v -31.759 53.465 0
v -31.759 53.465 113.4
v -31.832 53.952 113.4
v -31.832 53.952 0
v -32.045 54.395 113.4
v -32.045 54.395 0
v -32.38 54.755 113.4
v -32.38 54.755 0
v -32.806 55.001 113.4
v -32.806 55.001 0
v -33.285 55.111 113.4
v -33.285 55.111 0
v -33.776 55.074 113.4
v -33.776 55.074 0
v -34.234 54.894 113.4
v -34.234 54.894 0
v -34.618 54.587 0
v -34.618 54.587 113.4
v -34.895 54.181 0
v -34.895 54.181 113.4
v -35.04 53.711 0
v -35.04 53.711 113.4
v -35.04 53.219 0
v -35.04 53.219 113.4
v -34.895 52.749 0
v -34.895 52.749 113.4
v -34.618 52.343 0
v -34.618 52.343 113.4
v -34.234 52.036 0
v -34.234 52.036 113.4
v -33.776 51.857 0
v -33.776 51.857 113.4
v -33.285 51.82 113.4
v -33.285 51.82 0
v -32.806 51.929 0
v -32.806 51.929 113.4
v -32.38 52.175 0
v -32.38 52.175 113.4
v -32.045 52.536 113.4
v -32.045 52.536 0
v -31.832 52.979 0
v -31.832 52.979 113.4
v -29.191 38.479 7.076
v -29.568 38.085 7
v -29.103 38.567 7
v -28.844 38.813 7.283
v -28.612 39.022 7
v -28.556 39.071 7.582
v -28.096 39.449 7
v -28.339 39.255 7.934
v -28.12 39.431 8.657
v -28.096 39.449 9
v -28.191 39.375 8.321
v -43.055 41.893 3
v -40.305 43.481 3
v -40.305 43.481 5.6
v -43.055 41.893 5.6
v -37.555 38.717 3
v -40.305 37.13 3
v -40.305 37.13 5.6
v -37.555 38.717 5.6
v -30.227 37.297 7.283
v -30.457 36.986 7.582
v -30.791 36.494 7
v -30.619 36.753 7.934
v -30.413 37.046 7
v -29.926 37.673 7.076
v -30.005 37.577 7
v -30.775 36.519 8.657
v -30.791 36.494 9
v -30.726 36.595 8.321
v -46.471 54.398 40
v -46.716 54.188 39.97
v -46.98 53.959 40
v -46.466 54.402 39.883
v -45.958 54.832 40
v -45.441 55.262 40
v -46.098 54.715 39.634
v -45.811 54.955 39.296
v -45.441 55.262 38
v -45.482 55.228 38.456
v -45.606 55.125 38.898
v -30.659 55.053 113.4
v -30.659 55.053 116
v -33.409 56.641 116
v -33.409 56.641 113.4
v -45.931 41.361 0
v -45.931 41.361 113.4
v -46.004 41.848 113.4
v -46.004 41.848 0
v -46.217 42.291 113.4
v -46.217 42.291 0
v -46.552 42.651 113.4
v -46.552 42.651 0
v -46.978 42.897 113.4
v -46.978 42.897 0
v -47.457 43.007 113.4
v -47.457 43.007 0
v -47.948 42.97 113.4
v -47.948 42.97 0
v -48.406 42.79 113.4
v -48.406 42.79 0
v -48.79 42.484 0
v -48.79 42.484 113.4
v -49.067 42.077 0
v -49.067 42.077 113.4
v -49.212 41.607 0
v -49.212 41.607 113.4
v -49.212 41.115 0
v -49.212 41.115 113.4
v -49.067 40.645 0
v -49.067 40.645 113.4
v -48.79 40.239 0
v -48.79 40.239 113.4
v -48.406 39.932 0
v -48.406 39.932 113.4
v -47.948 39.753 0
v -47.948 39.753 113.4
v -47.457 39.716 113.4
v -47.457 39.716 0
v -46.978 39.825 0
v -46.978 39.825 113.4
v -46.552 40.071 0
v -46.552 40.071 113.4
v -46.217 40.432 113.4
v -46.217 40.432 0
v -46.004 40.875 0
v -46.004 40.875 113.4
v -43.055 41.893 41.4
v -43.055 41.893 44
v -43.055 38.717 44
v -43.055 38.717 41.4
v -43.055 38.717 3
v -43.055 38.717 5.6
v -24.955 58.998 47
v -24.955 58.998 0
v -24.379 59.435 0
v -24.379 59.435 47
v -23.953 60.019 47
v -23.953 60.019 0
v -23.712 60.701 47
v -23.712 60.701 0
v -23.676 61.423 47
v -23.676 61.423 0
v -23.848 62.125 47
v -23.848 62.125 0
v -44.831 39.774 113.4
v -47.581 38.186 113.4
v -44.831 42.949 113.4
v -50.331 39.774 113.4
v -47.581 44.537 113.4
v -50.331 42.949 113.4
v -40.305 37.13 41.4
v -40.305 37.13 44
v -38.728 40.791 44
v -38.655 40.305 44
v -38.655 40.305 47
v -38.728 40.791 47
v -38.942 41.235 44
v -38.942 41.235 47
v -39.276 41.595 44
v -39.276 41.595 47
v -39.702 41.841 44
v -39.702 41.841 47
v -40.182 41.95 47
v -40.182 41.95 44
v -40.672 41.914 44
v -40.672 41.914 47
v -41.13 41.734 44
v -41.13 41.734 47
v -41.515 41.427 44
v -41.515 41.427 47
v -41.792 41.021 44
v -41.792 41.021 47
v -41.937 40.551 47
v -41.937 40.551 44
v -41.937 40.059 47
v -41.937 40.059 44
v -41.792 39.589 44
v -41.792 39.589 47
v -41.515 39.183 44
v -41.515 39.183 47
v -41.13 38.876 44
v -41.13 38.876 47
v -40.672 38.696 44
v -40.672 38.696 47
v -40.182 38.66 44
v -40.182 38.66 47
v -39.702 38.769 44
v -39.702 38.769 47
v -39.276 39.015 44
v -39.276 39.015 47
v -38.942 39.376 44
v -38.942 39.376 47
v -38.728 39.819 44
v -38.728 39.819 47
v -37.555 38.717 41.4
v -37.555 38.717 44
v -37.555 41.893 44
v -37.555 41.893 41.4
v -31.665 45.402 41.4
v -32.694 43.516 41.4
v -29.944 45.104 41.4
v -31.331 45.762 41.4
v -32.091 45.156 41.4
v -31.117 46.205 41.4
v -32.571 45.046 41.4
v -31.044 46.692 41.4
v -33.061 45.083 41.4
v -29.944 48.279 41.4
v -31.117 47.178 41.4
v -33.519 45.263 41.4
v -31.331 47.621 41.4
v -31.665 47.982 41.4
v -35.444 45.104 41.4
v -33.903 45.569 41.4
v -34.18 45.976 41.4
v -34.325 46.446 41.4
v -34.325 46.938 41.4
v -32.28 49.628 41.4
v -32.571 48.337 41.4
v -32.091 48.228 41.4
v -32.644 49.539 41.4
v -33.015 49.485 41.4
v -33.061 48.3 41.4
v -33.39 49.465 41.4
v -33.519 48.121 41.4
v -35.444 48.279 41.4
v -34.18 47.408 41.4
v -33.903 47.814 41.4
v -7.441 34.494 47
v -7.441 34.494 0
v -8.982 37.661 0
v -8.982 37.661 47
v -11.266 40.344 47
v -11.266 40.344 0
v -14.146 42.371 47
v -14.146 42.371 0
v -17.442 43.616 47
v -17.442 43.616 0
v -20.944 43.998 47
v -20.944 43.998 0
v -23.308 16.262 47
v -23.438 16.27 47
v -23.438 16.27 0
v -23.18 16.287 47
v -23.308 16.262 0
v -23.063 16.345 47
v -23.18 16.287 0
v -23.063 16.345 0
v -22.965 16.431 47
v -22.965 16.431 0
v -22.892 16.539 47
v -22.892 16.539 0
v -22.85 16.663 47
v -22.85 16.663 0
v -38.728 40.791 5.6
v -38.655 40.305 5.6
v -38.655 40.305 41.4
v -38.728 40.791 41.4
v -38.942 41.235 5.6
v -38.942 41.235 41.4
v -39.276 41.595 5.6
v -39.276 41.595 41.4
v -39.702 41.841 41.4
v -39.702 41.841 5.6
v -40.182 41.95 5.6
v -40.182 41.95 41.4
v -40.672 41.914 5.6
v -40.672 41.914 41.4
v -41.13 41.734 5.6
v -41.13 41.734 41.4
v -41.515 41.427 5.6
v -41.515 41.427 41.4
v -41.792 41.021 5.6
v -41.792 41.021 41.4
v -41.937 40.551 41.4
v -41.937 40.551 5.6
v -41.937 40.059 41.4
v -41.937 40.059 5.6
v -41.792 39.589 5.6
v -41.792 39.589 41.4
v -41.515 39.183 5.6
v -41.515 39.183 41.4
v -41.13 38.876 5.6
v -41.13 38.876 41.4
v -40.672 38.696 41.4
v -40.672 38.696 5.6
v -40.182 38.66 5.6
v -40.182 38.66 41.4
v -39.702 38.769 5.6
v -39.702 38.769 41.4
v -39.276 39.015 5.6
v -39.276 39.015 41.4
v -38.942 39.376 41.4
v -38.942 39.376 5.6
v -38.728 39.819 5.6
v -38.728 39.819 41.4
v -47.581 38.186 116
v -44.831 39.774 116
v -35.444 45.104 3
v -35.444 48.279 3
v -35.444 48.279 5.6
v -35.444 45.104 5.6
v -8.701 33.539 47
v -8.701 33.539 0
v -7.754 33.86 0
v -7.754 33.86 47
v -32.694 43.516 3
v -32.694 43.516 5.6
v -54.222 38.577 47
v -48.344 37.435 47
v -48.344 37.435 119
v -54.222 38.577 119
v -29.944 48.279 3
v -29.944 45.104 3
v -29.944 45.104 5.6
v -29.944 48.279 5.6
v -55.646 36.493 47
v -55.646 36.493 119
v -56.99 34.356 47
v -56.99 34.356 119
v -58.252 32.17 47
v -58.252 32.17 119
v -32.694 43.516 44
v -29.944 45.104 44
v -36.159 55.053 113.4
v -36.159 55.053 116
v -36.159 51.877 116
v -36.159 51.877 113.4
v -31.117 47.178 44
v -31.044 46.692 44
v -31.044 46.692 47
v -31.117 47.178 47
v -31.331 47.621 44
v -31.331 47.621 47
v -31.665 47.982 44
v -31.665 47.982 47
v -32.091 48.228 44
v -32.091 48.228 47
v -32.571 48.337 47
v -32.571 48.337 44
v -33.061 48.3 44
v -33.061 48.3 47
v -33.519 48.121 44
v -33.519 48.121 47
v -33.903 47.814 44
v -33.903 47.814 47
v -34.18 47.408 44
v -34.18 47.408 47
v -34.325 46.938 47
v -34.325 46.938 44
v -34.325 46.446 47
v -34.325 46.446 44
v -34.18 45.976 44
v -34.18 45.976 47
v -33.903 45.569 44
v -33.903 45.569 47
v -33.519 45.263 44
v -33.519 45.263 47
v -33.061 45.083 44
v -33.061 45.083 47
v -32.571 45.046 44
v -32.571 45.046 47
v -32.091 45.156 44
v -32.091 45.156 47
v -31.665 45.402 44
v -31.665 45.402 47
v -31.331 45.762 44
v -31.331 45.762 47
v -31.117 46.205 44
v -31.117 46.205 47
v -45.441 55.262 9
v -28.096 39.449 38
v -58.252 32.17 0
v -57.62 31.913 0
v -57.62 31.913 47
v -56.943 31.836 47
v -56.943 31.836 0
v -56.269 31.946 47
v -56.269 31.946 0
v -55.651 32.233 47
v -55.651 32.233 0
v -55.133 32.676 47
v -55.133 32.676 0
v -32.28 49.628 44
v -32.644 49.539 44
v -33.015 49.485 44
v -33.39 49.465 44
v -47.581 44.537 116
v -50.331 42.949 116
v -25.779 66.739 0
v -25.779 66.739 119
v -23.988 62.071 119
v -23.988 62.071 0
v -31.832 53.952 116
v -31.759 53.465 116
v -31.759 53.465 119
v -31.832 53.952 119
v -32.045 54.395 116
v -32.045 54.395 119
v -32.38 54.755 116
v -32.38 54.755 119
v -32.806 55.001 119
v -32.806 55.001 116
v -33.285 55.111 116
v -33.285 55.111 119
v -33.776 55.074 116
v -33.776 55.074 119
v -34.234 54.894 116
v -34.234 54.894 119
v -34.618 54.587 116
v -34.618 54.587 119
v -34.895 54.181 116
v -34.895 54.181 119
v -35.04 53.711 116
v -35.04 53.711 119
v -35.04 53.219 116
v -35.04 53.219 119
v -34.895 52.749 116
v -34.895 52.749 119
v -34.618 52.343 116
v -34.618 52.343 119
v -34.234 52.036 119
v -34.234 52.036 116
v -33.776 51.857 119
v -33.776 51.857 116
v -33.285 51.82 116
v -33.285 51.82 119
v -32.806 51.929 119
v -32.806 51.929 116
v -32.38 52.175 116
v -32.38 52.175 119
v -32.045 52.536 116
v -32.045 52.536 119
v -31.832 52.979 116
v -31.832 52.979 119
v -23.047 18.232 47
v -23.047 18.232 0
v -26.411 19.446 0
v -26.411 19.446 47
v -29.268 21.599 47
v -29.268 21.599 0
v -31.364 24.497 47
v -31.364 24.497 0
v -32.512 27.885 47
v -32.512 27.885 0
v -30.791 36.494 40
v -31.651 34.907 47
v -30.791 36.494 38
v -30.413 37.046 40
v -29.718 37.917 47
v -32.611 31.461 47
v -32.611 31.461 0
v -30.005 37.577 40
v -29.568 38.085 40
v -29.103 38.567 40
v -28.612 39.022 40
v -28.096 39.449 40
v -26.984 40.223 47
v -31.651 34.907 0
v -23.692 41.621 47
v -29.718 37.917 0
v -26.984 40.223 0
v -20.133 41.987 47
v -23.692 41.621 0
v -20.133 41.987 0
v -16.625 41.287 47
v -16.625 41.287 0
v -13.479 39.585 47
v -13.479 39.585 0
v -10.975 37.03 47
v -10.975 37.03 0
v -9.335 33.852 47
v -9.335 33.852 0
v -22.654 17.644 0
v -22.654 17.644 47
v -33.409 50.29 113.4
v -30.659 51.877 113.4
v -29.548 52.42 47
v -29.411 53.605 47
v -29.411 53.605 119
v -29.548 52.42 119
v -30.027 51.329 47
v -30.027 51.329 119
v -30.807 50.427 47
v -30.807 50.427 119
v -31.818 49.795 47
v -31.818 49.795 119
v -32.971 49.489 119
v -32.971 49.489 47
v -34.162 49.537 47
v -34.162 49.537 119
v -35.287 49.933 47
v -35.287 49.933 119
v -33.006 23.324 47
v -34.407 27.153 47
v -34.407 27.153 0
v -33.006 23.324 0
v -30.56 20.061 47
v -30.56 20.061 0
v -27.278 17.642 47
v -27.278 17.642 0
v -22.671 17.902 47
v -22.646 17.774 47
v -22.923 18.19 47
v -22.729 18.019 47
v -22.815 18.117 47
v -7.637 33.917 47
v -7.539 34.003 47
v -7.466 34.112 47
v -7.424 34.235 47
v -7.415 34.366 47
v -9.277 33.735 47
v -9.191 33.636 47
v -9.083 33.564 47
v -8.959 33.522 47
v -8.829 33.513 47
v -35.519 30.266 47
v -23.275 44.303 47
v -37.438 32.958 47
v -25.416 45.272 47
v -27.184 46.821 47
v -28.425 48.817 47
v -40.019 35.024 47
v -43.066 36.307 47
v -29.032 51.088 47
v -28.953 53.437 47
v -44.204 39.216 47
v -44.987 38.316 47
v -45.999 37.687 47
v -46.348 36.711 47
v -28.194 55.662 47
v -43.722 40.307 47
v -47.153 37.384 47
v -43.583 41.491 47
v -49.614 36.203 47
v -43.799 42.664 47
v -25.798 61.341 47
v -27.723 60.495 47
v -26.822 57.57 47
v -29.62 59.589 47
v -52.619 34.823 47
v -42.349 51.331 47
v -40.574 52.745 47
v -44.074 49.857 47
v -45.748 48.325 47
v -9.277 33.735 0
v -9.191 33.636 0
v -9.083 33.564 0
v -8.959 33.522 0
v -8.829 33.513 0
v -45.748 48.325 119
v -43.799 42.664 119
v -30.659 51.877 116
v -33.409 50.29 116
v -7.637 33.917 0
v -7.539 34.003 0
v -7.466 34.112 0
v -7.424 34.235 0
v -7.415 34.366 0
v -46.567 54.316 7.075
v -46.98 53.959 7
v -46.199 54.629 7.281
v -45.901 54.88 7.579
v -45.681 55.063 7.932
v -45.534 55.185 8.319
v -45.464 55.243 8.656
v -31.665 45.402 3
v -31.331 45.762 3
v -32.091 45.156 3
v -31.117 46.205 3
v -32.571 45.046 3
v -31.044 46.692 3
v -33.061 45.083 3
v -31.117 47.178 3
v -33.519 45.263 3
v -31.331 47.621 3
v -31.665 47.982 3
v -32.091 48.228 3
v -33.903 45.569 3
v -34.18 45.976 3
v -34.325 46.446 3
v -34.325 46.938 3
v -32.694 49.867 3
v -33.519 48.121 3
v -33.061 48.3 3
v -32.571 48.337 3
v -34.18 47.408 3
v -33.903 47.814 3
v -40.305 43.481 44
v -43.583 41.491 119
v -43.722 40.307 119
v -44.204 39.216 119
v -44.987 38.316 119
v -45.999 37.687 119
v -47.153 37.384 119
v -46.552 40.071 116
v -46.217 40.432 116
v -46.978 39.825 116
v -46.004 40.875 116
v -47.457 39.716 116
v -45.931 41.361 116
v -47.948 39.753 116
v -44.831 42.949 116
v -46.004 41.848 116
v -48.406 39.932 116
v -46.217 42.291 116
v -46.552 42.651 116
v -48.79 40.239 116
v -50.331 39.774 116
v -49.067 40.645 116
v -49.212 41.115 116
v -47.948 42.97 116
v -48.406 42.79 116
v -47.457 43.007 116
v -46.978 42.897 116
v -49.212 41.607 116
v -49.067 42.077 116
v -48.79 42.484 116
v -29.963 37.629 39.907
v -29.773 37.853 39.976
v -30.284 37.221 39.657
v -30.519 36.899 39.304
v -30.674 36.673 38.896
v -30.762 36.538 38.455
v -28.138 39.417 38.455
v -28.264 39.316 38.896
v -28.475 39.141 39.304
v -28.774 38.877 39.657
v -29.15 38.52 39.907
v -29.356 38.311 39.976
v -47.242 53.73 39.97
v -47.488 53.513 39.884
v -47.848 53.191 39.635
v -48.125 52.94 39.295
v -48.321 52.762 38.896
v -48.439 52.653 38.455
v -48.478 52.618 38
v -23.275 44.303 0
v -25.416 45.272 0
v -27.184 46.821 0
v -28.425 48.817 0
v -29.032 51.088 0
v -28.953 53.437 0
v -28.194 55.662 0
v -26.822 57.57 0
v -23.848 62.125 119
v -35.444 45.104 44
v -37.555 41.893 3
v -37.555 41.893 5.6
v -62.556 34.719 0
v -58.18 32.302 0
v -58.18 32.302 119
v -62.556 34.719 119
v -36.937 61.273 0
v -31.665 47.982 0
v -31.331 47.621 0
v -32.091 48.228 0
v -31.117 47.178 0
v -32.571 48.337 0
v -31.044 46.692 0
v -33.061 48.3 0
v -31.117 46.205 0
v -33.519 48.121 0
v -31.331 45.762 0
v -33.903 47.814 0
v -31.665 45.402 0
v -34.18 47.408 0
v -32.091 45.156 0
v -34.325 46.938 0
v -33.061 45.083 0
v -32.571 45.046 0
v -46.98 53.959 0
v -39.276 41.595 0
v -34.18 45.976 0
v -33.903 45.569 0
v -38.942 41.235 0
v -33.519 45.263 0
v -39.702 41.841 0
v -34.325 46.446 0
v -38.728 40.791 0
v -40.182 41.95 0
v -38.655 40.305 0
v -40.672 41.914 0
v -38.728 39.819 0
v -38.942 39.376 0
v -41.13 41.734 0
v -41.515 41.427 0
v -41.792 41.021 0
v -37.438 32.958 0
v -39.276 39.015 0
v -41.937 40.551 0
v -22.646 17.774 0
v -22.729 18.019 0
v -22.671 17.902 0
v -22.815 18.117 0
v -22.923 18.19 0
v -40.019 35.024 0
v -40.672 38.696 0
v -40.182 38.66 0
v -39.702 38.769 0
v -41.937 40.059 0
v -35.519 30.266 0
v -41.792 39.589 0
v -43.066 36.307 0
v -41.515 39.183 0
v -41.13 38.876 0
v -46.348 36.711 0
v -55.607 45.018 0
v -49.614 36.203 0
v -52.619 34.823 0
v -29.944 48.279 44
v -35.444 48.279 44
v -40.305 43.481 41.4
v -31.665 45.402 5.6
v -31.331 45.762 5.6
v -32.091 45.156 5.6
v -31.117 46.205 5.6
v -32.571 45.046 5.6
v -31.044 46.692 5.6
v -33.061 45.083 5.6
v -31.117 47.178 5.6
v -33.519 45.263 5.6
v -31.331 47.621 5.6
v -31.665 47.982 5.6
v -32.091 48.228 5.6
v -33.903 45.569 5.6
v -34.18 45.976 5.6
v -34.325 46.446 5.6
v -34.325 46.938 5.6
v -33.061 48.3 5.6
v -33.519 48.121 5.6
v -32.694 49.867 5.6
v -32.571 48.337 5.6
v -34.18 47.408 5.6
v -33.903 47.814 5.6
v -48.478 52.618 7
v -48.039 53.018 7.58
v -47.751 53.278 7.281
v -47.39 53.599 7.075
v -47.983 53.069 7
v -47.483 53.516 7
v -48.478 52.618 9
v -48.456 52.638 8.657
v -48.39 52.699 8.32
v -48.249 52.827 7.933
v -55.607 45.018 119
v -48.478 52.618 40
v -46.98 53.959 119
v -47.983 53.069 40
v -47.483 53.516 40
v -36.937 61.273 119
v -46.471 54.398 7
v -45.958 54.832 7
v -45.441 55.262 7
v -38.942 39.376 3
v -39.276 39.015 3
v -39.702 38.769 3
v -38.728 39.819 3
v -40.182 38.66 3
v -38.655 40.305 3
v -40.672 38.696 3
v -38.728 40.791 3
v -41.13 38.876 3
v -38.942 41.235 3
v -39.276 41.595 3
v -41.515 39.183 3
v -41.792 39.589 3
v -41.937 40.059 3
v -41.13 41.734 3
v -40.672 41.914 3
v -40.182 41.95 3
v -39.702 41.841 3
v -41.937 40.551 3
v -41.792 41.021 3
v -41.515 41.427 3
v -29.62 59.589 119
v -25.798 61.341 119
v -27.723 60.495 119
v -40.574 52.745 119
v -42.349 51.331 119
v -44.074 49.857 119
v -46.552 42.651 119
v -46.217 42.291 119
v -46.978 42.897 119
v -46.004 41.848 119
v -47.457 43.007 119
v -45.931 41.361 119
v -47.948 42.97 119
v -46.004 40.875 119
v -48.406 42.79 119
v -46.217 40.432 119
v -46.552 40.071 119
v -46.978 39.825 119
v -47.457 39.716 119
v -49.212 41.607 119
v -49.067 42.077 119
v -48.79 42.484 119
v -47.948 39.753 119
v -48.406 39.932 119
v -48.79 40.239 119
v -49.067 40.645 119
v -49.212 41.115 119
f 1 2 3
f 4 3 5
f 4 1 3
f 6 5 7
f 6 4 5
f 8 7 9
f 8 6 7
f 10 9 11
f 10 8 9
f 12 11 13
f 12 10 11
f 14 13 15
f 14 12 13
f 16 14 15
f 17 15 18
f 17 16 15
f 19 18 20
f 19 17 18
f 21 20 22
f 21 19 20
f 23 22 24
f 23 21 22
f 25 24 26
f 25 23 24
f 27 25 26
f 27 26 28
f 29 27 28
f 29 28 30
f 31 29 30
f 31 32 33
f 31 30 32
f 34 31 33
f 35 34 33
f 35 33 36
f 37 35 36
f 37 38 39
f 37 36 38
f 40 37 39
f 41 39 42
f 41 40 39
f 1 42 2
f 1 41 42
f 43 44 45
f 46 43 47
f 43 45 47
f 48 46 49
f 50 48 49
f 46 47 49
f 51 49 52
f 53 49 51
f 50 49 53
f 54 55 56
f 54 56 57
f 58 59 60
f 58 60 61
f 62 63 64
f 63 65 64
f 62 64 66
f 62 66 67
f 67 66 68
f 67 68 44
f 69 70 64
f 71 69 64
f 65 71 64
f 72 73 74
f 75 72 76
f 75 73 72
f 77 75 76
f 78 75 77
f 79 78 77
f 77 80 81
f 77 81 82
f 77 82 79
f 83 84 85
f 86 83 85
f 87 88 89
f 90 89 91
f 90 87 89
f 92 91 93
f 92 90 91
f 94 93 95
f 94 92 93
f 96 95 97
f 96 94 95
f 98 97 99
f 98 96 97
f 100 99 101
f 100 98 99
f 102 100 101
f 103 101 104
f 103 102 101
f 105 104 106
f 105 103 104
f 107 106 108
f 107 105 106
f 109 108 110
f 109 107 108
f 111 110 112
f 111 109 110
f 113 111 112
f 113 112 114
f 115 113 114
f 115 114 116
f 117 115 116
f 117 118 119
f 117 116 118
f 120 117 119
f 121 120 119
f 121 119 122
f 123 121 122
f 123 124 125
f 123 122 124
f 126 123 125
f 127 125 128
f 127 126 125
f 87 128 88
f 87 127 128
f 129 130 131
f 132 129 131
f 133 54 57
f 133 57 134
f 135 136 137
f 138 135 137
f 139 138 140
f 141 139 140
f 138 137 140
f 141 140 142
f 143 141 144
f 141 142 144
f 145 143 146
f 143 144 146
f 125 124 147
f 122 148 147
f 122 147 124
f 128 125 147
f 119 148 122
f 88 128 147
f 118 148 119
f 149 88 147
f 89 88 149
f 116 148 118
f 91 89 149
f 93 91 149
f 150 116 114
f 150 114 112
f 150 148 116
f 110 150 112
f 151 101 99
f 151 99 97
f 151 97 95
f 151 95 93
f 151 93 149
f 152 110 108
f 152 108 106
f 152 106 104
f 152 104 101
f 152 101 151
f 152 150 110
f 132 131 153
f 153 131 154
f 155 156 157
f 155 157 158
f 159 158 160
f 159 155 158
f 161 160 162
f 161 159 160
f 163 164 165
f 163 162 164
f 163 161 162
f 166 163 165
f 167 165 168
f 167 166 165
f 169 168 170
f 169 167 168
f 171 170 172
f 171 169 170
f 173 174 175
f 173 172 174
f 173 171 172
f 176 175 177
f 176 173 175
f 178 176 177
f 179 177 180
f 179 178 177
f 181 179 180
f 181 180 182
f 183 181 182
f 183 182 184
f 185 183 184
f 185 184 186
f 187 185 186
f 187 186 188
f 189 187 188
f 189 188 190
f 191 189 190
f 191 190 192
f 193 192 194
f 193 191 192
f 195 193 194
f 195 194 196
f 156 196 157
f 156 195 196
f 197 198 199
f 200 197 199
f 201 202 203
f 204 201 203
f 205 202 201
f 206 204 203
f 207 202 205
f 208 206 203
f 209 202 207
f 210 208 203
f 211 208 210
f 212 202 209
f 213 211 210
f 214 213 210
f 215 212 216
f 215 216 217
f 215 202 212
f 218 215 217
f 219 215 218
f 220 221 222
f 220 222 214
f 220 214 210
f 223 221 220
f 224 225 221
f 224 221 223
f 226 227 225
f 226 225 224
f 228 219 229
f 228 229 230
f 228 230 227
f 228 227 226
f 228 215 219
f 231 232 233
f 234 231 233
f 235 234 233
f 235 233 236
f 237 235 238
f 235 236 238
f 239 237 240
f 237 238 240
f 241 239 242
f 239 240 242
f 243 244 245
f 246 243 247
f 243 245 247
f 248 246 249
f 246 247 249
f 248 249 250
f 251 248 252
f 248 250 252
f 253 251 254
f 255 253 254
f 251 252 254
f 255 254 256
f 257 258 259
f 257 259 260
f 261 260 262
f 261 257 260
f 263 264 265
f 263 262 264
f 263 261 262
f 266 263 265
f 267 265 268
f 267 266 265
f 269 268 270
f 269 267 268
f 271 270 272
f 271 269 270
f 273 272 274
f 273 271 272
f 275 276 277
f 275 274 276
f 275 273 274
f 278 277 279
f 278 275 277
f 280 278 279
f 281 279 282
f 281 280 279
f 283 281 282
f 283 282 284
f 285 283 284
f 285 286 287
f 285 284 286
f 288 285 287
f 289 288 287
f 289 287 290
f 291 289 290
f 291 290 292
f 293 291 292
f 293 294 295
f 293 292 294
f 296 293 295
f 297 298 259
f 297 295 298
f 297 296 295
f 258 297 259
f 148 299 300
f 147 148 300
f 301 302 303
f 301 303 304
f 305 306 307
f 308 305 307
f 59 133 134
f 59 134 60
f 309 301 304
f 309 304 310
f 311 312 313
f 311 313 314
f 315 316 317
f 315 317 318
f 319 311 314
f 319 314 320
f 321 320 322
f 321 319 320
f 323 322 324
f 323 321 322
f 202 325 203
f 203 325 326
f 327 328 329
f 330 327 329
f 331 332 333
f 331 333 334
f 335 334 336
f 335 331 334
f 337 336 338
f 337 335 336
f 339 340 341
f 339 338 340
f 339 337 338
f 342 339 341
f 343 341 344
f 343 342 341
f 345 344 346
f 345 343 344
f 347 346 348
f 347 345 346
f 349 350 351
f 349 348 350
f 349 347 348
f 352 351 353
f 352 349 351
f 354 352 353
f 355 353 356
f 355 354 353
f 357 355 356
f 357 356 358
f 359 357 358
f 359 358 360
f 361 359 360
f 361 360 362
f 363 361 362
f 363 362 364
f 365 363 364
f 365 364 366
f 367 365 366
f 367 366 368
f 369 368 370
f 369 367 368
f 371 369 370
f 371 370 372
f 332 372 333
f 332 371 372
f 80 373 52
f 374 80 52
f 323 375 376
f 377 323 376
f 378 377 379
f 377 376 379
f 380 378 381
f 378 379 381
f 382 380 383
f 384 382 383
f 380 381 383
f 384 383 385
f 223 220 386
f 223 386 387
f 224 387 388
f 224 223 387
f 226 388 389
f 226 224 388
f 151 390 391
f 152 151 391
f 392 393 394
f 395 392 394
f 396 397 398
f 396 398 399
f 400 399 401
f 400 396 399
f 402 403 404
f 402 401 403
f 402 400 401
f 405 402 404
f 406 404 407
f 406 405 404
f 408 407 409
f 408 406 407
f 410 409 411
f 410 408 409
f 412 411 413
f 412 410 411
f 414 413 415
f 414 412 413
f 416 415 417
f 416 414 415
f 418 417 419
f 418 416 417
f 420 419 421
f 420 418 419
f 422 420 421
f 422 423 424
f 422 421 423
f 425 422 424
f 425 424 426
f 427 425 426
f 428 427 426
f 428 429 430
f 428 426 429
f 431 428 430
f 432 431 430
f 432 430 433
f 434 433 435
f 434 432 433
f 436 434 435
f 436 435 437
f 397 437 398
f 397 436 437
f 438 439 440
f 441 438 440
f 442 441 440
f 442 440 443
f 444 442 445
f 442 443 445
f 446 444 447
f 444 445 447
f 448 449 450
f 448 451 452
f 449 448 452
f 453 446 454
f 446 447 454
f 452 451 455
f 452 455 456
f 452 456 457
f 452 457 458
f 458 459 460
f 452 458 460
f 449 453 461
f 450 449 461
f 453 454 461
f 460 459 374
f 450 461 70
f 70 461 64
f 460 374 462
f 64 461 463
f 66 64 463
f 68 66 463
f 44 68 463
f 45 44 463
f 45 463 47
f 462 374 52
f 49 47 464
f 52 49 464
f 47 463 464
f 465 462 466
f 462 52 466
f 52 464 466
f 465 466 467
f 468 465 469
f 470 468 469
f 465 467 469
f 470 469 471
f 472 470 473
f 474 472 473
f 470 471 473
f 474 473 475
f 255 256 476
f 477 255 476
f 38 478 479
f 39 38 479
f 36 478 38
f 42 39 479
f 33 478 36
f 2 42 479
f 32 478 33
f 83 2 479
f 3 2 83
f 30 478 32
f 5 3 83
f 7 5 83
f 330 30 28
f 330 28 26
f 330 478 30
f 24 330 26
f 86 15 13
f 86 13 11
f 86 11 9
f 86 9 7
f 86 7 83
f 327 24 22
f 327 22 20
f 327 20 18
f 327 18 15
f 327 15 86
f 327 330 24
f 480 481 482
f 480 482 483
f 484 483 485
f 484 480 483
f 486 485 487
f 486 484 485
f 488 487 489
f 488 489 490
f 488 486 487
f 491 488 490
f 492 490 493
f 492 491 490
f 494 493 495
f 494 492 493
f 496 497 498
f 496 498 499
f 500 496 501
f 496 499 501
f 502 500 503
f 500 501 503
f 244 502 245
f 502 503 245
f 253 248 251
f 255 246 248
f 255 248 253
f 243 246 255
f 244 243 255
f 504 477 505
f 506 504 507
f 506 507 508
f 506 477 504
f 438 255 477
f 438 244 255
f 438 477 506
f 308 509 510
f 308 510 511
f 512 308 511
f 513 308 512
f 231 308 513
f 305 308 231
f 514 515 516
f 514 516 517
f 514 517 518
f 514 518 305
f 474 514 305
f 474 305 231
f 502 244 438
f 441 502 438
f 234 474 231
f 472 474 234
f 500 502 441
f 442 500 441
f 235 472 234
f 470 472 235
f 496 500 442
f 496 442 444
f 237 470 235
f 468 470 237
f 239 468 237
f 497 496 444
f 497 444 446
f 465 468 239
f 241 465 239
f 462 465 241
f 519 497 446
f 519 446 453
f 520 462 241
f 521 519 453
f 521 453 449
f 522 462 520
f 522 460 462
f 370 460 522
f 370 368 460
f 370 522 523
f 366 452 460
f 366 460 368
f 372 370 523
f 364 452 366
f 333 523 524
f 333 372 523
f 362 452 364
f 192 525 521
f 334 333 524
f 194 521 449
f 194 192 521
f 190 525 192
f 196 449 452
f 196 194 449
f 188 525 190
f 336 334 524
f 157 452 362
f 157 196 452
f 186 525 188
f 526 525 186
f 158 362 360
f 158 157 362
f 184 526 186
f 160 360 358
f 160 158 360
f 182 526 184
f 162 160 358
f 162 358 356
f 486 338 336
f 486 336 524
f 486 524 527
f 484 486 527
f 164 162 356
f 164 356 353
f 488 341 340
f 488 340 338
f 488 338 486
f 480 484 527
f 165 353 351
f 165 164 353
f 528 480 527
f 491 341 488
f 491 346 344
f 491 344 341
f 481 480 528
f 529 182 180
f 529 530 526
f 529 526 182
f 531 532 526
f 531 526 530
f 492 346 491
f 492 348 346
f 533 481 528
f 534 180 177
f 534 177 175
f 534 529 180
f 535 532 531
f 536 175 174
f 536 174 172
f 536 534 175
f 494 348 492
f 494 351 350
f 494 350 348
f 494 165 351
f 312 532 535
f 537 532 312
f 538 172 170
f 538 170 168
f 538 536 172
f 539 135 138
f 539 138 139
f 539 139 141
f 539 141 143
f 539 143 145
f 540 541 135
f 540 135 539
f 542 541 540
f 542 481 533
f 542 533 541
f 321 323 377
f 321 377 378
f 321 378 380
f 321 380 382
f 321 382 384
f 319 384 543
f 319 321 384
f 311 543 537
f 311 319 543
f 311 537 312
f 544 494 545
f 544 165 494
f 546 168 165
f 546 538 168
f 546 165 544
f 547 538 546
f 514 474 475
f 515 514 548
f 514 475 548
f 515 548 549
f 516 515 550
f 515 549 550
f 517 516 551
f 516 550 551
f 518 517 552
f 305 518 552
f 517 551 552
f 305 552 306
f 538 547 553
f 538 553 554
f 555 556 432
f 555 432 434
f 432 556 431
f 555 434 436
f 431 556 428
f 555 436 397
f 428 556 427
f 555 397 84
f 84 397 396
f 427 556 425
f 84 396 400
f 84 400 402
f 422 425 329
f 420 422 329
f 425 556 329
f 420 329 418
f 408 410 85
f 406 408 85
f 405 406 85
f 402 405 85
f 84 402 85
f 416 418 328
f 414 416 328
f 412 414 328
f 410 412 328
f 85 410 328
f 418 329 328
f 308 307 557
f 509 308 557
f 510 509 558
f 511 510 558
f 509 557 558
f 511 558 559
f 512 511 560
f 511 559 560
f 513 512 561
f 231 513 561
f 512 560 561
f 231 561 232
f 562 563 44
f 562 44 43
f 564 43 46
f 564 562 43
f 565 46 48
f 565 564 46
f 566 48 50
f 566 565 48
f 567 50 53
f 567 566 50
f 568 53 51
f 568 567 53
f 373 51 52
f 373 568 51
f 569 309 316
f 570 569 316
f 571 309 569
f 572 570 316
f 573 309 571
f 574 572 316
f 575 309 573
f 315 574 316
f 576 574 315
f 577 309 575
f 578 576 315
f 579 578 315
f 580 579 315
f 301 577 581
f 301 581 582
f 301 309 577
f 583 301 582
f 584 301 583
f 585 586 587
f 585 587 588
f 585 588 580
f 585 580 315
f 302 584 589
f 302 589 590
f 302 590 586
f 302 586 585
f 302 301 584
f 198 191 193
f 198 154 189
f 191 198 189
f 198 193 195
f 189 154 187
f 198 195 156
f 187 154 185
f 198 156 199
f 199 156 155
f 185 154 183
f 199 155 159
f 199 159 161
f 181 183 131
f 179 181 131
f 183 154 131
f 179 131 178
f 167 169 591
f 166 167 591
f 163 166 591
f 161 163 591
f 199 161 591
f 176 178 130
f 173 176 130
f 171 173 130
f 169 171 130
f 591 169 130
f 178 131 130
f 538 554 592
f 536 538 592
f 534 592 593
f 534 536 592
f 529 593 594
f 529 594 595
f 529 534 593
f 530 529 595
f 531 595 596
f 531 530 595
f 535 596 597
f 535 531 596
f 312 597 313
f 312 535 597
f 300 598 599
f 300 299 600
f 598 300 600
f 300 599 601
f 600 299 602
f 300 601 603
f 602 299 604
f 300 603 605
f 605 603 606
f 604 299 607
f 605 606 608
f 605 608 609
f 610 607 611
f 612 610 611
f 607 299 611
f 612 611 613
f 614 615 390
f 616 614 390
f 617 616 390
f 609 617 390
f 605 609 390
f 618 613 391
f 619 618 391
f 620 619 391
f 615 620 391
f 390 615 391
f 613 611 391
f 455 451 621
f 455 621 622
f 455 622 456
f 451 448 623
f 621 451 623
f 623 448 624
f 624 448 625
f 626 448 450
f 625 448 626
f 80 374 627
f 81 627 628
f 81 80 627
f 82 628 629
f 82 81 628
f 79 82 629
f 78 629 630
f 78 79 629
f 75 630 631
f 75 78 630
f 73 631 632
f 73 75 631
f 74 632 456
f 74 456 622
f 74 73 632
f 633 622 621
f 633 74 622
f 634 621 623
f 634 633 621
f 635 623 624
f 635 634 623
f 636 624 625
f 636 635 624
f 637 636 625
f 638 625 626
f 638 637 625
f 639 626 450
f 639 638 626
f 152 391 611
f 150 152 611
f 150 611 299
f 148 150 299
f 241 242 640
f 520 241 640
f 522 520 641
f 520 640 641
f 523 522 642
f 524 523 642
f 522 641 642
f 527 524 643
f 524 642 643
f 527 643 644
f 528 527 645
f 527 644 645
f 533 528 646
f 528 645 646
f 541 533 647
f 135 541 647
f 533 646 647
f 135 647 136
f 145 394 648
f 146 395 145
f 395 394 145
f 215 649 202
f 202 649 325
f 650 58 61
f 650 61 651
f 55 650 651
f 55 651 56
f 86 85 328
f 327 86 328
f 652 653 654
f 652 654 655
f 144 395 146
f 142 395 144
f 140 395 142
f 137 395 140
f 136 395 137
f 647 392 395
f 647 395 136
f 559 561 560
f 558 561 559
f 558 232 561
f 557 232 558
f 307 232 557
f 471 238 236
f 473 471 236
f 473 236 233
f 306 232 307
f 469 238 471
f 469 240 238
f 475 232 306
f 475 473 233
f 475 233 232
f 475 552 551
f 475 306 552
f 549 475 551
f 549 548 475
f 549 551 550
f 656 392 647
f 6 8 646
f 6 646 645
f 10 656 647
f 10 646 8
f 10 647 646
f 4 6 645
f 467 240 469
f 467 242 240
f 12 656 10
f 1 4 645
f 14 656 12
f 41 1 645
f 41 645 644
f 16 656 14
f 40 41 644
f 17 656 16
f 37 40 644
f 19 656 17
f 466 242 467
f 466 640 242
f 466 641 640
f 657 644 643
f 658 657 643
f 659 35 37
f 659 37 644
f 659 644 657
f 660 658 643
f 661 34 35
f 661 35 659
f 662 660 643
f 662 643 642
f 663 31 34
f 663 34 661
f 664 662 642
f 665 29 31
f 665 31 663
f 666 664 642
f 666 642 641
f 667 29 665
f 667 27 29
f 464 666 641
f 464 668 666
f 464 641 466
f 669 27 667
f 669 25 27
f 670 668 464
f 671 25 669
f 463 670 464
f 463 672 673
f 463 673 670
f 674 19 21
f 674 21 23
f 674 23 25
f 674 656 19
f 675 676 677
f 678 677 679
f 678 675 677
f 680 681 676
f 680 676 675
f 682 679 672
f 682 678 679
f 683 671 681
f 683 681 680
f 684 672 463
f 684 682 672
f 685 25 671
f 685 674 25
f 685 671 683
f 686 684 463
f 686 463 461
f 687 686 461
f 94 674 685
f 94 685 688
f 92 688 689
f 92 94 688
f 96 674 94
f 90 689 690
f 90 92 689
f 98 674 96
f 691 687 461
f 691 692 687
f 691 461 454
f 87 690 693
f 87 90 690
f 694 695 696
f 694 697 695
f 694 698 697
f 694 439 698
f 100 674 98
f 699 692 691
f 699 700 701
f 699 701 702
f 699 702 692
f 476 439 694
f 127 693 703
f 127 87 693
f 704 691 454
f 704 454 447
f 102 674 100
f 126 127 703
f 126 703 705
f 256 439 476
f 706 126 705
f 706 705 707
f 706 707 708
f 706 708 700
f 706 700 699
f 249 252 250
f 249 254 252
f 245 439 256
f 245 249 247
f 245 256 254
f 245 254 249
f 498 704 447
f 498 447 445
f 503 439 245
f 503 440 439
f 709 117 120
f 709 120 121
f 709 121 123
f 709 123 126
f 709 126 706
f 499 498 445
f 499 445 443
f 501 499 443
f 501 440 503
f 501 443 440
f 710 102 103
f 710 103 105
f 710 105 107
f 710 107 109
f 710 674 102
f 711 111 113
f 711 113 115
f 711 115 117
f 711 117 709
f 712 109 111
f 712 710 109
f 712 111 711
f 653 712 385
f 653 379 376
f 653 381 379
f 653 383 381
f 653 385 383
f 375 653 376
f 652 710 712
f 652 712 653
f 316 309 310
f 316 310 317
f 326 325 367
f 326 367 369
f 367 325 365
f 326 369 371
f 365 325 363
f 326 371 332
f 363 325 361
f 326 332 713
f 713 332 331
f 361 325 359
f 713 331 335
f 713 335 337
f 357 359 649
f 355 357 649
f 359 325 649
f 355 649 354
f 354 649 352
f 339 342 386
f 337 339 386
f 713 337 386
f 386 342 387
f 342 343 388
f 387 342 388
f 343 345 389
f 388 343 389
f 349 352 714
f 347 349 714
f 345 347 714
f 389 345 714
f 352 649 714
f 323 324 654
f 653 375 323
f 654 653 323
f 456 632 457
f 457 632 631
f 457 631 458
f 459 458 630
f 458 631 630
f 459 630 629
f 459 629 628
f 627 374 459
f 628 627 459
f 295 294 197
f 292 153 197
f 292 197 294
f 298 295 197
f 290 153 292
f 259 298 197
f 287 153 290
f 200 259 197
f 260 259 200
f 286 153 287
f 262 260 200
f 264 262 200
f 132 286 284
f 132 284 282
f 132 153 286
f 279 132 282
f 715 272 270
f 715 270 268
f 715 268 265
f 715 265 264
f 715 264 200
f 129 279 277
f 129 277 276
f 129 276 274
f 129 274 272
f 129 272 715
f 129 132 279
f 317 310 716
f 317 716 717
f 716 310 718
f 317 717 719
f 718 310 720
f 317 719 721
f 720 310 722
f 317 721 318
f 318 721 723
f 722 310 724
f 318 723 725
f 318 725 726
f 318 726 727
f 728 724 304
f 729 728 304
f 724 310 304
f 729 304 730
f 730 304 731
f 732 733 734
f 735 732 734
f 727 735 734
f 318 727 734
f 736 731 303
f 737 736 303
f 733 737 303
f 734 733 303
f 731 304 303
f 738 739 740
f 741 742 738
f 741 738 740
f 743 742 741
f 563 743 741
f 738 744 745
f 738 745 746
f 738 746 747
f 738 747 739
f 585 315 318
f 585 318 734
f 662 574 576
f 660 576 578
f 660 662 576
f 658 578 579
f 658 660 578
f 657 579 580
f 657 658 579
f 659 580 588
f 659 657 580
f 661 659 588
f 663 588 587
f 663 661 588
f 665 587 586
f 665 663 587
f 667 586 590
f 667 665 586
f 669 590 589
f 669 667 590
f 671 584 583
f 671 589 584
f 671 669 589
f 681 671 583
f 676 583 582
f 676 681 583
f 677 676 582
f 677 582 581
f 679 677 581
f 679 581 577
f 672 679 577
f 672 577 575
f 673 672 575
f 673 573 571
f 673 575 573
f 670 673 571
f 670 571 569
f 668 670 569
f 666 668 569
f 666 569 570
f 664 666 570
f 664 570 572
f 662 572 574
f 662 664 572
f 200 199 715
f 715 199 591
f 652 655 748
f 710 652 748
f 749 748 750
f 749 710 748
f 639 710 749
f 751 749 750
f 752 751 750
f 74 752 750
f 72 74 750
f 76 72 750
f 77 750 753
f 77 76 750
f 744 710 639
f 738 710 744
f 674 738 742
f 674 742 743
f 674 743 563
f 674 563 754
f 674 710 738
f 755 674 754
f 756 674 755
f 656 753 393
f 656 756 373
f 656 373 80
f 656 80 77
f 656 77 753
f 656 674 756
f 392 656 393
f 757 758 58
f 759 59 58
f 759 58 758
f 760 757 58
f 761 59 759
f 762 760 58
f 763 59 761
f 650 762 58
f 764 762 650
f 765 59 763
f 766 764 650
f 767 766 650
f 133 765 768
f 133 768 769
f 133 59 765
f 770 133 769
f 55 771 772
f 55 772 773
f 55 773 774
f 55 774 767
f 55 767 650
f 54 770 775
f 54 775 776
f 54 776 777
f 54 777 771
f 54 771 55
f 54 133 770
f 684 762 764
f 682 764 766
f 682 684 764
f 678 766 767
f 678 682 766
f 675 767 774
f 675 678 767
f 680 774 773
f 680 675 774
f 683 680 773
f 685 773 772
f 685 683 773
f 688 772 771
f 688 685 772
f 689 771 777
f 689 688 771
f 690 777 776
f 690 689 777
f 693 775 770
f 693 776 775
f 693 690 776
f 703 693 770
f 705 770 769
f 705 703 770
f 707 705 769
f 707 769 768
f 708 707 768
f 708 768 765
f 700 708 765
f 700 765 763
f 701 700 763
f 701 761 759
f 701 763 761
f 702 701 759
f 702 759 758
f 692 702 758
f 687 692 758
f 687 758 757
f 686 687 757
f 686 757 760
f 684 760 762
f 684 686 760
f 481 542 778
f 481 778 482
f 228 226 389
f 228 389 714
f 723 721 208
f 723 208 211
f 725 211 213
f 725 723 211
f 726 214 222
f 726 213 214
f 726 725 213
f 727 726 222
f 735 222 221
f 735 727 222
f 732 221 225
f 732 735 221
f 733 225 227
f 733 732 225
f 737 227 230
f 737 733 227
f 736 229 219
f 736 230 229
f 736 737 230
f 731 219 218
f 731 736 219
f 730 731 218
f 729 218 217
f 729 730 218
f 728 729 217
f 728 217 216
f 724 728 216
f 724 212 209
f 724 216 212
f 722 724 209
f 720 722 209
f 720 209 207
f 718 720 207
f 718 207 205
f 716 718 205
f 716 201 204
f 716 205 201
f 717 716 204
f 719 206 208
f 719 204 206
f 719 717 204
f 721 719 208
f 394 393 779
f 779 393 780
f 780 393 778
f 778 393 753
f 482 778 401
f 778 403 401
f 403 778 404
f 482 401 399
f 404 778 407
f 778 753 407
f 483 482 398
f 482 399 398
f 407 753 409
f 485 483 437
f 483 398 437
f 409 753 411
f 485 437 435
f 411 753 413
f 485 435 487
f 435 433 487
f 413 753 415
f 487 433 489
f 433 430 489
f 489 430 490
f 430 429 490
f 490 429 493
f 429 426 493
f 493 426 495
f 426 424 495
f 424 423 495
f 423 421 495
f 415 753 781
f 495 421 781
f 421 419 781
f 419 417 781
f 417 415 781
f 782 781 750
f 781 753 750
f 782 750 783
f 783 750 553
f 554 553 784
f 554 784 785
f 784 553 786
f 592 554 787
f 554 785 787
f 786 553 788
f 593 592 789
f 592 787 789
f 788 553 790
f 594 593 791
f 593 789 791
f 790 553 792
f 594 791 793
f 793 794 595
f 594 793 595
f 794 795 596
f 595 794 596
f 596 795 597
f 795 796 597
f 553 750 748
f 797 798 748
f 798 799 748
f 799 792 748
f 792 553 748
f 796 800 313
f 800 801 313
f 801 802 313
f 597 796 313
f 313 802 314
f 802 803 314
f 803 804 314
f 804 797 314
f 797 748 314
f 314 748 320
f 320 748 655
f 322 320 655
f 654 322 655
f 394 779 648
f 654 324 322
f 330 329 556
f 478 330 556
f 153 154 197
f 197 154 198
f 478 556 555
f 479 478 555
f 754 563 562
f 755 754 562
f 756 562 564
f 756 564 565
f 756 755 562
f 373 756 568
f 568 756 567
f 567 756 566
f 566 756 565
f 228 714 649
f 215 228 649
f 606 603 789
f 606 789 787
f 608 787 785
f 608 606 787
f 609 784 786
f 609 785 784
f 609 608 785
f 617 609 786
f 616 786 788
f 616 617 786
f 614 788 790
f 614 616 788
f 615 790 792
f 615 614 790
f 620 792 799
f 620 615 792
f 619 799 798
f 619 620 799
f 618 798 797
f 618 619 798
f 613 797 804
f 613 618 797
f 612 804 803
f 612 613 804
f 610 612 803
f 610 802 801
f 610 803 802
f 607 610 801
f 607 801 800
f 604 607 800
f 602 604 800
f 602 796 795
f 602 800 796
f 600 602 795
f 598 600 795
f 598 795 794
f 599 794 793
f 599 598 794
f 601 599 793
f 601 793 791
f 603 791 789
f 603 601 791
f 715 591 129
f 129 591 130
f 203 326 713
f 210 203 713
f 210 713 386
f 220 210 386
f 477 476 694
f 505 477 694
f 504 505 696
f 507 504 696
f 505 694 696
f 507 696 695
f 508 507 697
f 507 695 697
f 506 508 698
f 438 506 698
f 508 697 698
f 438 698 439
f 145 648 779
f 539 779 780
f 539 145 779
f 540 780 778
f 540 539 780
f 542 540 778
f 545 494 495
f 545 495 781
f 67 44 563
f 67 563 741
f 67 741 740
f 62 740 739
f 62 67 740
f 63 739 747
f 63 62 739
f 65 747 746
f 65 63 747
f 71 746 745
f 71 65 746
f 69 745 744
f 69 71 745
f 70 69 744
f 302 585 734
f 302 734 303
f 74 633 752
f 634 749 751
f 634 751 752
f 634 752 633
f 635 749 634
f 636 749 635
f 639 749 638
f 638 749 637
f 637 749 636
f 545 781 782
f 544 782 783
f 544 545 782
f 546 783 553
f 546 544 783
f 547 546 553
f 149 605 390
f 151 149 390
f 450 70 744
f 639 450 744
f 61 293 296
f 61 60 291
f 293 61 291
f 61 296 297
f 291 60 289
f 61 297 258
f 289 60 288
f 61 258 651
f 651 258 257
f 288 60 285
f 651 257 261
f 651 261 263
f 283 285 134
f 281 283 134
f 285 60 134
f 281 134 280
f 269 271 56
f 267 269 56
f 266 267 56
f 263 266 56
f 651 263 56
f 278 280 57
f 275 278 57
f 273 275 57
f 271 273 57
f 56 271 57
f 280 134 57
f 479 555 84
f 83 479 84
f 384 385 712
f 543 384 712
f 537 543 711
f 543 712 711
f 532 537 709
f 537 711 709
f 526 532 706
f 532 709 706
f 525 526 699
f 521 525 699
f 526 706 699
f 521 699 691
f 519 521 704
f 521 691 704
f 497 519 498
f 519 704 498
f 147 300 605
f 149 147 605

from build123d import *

# Parameters (mm, degrees)
BOSS_EXTRUDE1_DEPTH     = 119
BOSS_EXTRUDE2_DEPTH     = 47
SKETCH4_R               = 1.65
CUT_EXTRUDE1_DEPTH      = 151.148950374
CUT_EXTRUDE2_START      = 44
CUT_EXTRUDE2_DEPTH      = 2.6
BOSS_EXTRUDE3_DEPTH     = 119
SKETCH7_R               = 1.65
CUT_EXTRUDE3_DEPTH      = 151.148950374
CUT_EXTRUDE4_START      = 116
CUT_EXTRUDE4_DEPTH      = 2.6
CUT_EXTRUDE5_START      = 3
CUT_EXTRUDE5_DEPTH      = 2.6
CUT_EXTRUDE_THIN1_DEPTH = 151.148950374
CUT_EXTRUDE6_START      = 7
CUT_EXTRUDE6_DEPTH      = 33
FILLET1_R               = 2


with BuildPart() as part:
    # Sketch1 → Boss-Extrude1 (new body)
    with BuildSketch(Plane(origin=(0, 0, 0), x_dir=(0, 1, 0), z_dir=(0, 0, 1))):
        with BuildLine():
            Line((66.793011614, 25.63943495), (62.125109481, 23.847595202))
            ThreePointArc((62.125109481, 23.847595202), (50.18784505, 43.696878999), (32.170193606, 58.252173078))
            Line((32.170193606, 58.252173078), (34.587369472, 62.629073903))
            ThreePointArc((34.587369472, 62.629073903), (53.95881545, 46.980136869), (66.793011614, 25.63943495))
        make_face()
    extrude(amount=BOSS_EXTRUDE1_DEPTH)

    # Sketch3 → Boss-Extrude2 (add)
    with BuildSketch(Plane(origin=(0, 0, 0), x_dir=(0, 1, 0), z_dir=(0, 0, 1))):
        with BuildLine():
            Line((16.662914887, 22.849921086), (17.643603591, 22.654345869))
            ThreePointArc((17.643603591, 22.654345869), (18.018970735, 22.728818123), (18.231735551, 23.046902612))
            ThreePointArc((18.231735551, 23.046902612), (37.916609506, 29.718164665), (33.851654942, 9.334932723))
            ThreePointArc((33.851654942, 9.334932723), (33.563813587, 9.082754287), (33.538596095, 8.700902631))
            Line((33.538596095, 8.700902631), (33.85956734, 7.753813691))
            ThreePointArc((33.85956734, 7.753813691), (34.111745776, 7.465972336), (34.493597433, 7.440754844))
            ThreePointArc((34.493597433, 7.440754844), (41.448499021, 12.641968592), (43.997873295, 20.944014808))
            ThreePointArc((43.997873295, 20.944014808), (49.930251766, 28.811968202), (58.997685125, 24.954578252))
            ThreePointArc((58.997685125, 24.954578252), (60.351321071, 23.807583941), (62.125109481, 23.847595202))
            ThreePointArc((62.125109481, 23.847595202), (50.18784505, 43.696878999), (32.170193606, 58.252173078))
            ThreePointArc((32.170193606, 58.252173078), (31.867825608, 56.602303211), (32.676329677, 55.132671232))
            ThreePointArc((32.676329677, 55.132671232), (36.307290349, 43.066223982), (27.152640183, 34.407390053))
            ThreePointArc((27.152640183, 34.407390053), (20.061145201, 30.559977956), (16.270358143, 23.438053047))
            ThreePointArc((16.270358143, 23.438053047), (16.344830398, 23.062685903), (16.662914887, 22.849921086))
        make_face()
    extrude(amount=BOSS_EXTRUDE2_DEPTH)

    # Sketch4 → Cut-Extrude1 (cut, through all)
    with BuildSketch(Plane(origin=(0, 0, 0), x_dir=(0, 1, 0), z_dir=(0, 0, 1))):
        with Locations(Location((40.305086528, 40.305086528, 0), (0, 0, 270))):
            Circle(SKETCH4_R)
        with Locations(Location((46.691666524, 32.693856872, 0), (0, 0, 270))):
            Circle(SKETCH4_R)
    extrude(amount=CUT_EXTRUDE1_DEPTH, mode=Mode.SUBTRACT)

    # Sketch5 → Cut-Extrude2 (cut)
    with BuildSketch(Plane(origin=(0, 0, 0), x_dir=(0, 1, 0), z_dir=(0, 0, 1)).offset(CUT_EXTRUDE2_START)):
        Polygon((43.480513008, 40.305086528), (41.892799768, 43.055086528), (38.717373287, 43.055086528), (37.129660047, 40.305086528), (38.717373287, 37.555086528), (41.892799768, 37.555086528), align=None)
        Polygon((49.867093005, 32.693856872), (48.279379765, 35.443856872), (45.103953284, 35.443856872), (43.516240044, 32.693856872), (45.103953284, 29.943856872), (48.279379765, 29.943856872), align=None)
    extrude(amount=-CUT_EXTRUDE2_DEPTH, mode=Mode.SUBTRACT)

    # Sketch6 → Boss-Extrude3 (add)
    with BuildSketch(Plane(origin=(0, 0, 0), x_dir=(0, 1, 0), z_dir=(0, 0, 1))):
        with BuildLine():
            ThreePointArc((38.577322779, 54.222017596), (43.657448084, 50.222149016), (48.32540701, 45.748137255))
            Line((48.32540701, 45.748137255), (42.663514101, 43.798591183))
            ThreePointArc((42.663514101, 43.798591183), (38.737005367, 44.561827164), (37.434732749, 48.343901467))
            Line((37.434732749, 48.343901467), (38.577322779, 54.222017596))
        make_face()
        with BuildLine():
            ThreePointArc((52.744660964, 40.57385568), (56.433360559, 35.263477438), (59.589277435, 29.620179604))
            Line((59.589277435, 29.620179604), (53.604790209, 29.411196706))
            ThreePointArc((53.604790209, 29.411196706), (50.072999838, 31.289082957), (49.933401851, 35.286646265))
            Line((49.933401851, 35.286646265), (52.744660964, 40.57385568))
        make_face()
    extrude(amount=BOSS_EXTRUDE3_DEPTH)

    # Sketch7 → Cut-Extrude3 (cut, through all)
    with BuildSketch(Plane(origin=(0, 0, 0), x_dir=(0, 1, 0), z_dir=(0, 0, 1))):
        with Locations(Location((41.361241483, 47.580665485, 0), (0, 0, 270))):
            Circle(SKETCH7_R)
        with Locations(Location((53.465192222, 33.408760014, 0), (0, 0, 270))):
            Circle(SKETCH7_R)
    extrude(amount=CUT_EXTRUDE3_DEPTH, mode=Mode.SUBTRACT)

    # Sketch8 → Cut-Extrude4 (cut)
    with BuildSketch(Plane(origin=(0, 0, 0), x_dir=(0, 1, 0), z_dir=(0, 0, 1)).offset(CUT_EXTRUDE4_START)):
        Polygon((44.536667963, 47.580665485), (42.948954723, 50.330665485), (39.773528242, 50.330665485), (38.185815002, 47.580665485), (39.773528242, 44.830665485), (42.948954723, 44.830665485), align=None)
        Polygon((56.640618703, 33.408760014), (55.052905462, 36.158760014), (51.877478982, 36.158760014), (50.289765742, 33.408760014), (51.877478982, 30.658760014), (55.052905462, 30.658760014), align=None)
    extrude(amount=-CUT_EXTRUDE4_DEPTH, mode=Mode.SUBTRACT)

    # Sketch5<2> → Cut-Extrude5 (cut)
    with BuildSketch(Plane(origin=(0, 0, 0), x_dir=(0, 1, 0), z_dir=(0, 0, 1)).offset(CUT_EXTRUDE5_START)):
        Polygon((43.480513008, 40.305086528), (41.892799768, 43.055086528), (38.717373287, 43.055086528), (37.129660047, 40.305086528), (38.717373287, 37.555086528), (41.892799768, 37.555086528), align=None)
        Polygon((49.867093005, 32.693856872), (48.279379765, 35.443856872), (45.103953284, 35.443856872), (43.516240044, 32.693856872), (45.103953284, 29.943856872), (48.279379765, 29.943856872), align=None)
    extrude(amount=CUT_EXTRUDE5_DEPTH, mode=Mode.SUBTRACT)

    # Sketch9 → Cut-Extrude-Thin1 (cut, through all)
    with BuildSketch(Plane(origin=(0, 0, 0), x_dir=(0, 1, 0), z_dir=(0, 0, 1))):
        Polygon((62.178864674, 23.707558139), (66.846766806, 25.499397886), (66.739256421, 25.779472014), (62.071354289, 23.987632266), align=None)
        Polygon((32.301500631, 58.179657802), (34.718676497, 62.556558627), (34.456062447, 62.701589179), (32.038886581, 58.324688354), align=None)
    extrude(amount=CUT_EXTRUDE_THIN1_DEPTH, mode=Mode.SUBTRACT)

    # Sketch10 → Cut-Extrude6 (cut)
    with BuildSketch(Plane(origin=(0, 0, 0), x_dir=(0, 1, 0), z_dir=(0, 0, 1)).offset(CUT_EXTRUDE6_START)):
        Polygon((35.44701831, 29.64338025), (54.282655982, 50.303964956), (57.23861856, 47.609102207), (38.402980888, 26.948517501), align=None)
    extrude(amount=CUT_EXTRUDE6_DEPTH, mode=Mode.SUBTRACT)

    # Fillet1
    # the kernel refuses this fillet: 2 mm, written as the material it adds along each edge
    with BuildSketch(Plane(origin=(-27.096333376, 33.124951788, 40), x_dir=(0.673715687259404, 0.7389906445555241, 0), z_dir=(-0.7389906445555242, 0.673715687259404, 0))) as fillet1_piece_1_section:
        with BuildLine():
            CenterArc((FILLET1_R, FILLET1_R), FILLET1_R, 180, 90)
            Line((0, FILLET1_R), (0, 0))
            Line((0, 0), (FILLET1_R, 0))
        make_face()
    fillet1_piece_1 = extrude(amount=33.933040427, mode=Mode.PRIVATE)
    fillet1_piece_1 = fillet1_piece_1 & Plane(origin=(0, 0, 39.546220167), x_dir=(-0.8753801649783101, 0.4834351732782244, 0), z_dir=(0, 0, -1)) * Cylinder(71.545, 76, mode=Mode.PRIVATE)
    fillet1_piece_1 = fillet1_piece_1 - Plane(origin=(-20.7, 30, 39.546220167), x_dir=(-0.19557521764305516, -0.9806887040462288, 0), z_dir=(0, 0, -1)) * Cylinder(12, 76, mode=Mode.PRIVATE)
    add(fillet1_piece_1)
    with BuildSketch(Plane(origin=(-49.13548978, 58.630180498, 40), x_dir=(-0.6737156872594037, -0.7389906445555243, 0), z_dir=(0.7389906445555244, -0.6737156872594038, 0))) as fillet1_piece_2_section:
        with BuildLine():
            CenterArc((FILLET1_R, FILLET1_R), FILLET1_R, 180, 90)
            Line((0, FILLET1_R), (0, 0))
            Line((0, 0), (FILLET1_R, 0))
        make_face()
    fillet1_piece_2 = extrude(amount=33.470003085, mode=Mode.PRIVATE)
    fillet1_piece_2 = fillet1_piece_2 & Plane(origin=(0, 0, 39.547293042), x_dir=(-0.8753801649783101, 0.4834351732782244, 0), z_dir=(0, 0, -1)) * Cylinder(71.545, 75, mode=Mode.PRIVATE)
    fillet1_piece_2 = fillet1_piece_2 - Plane(origin=(-20.7, 30, 39.547293042), x_dir=(-0.19557521764305516, -0.9806887040462288, 0), z_dir=(0, 0, -1)) * Cylinder(12, 75, mode=Mode.PRIVATE)
    add(fillet1_piece_2)
    with BuildSketch(Plane(origin=(-27.096333376, 33.124951788, 7), x_dir=(0.673715687259404, 0.7389906445555241, 0), z_dir=(-0.7389906445555242, 0.673715687259404, 0))) as fillet1_piece_3_section:
        with BuildLine():
            CenterArc((FILLET1_R, -FILLET1_R), FILLET1_R, 90, 90)
            Line((0, -FILLET1_R), (0, 0))
            Line((0, 0), (FILLET1_R, 0))
        make_face()
    fillet1_piece_3 = extrude(amount=33.933040427, mode=Mode.PRIVATE)
    fillet1_piece_3 = fillet1_piece_3 & Plane(origin=(0, 0, 7.453779833), x_dir=(-0.8753801649783101, 0.4834351732782244, 0), z_dir=(0, 0, -1)) * Cylinder(71.545, 76, mode=Mode.PRIVATE)
    fillet1_piece_3 = fillet1_piece_3 - Plane(origin=(-20.7, 30, 7.453779833), x_dir=(-0.19557521764305516, -0.9806887040462288, 0), z_dir=(0, 0, -1)) * Cylinder(12, 76, mode=Mode.PRIVATE)
    add(fillet1_piece_3)
    with BuildSketch(Plane(origin=(-49.13548978, 58.630180498, 7), x_dir=(0, 0, 1), z_dir=(0.7389906445555244, -0.6737156872594038, 0))) as fillet1_piece_4_section:
        with BuildLine():
            CenterArc((FILLET1_R, FILLET1_R), FILLET1_R, 180, 90)
            Line((0, FILLET1_R), (0, 0))
            Line((0, 0), (FILLET1_R, 0))
        make_face()
    fillet1_piece_4 = extrude(amount=33.470003085, mode=Mode.PRIVATE)
    fillet1_piece_4 = fillet1_piece_4 & Plane(origin=(0, 0, 7.452710361), x_dir=(-0.8753801649783101, 0.4834351732782244, 0), z_dir=(0, 0, -1)) * Cylinder(71.545, 75, mode=Mode.PRIVATE)
    fillet1_piece_4 = fillet1_piece_4 - Plane(origin=(-20.7, 30, 7.452710361), x_dir=(-0.19557521764305516, -0.9806887040462288, 0), z_dir=(0, 0, -1)) * Cylinder(12, 75, mode=Mode.PRIVATE)
    add(fillet1_piece_4)


solid = part.part
